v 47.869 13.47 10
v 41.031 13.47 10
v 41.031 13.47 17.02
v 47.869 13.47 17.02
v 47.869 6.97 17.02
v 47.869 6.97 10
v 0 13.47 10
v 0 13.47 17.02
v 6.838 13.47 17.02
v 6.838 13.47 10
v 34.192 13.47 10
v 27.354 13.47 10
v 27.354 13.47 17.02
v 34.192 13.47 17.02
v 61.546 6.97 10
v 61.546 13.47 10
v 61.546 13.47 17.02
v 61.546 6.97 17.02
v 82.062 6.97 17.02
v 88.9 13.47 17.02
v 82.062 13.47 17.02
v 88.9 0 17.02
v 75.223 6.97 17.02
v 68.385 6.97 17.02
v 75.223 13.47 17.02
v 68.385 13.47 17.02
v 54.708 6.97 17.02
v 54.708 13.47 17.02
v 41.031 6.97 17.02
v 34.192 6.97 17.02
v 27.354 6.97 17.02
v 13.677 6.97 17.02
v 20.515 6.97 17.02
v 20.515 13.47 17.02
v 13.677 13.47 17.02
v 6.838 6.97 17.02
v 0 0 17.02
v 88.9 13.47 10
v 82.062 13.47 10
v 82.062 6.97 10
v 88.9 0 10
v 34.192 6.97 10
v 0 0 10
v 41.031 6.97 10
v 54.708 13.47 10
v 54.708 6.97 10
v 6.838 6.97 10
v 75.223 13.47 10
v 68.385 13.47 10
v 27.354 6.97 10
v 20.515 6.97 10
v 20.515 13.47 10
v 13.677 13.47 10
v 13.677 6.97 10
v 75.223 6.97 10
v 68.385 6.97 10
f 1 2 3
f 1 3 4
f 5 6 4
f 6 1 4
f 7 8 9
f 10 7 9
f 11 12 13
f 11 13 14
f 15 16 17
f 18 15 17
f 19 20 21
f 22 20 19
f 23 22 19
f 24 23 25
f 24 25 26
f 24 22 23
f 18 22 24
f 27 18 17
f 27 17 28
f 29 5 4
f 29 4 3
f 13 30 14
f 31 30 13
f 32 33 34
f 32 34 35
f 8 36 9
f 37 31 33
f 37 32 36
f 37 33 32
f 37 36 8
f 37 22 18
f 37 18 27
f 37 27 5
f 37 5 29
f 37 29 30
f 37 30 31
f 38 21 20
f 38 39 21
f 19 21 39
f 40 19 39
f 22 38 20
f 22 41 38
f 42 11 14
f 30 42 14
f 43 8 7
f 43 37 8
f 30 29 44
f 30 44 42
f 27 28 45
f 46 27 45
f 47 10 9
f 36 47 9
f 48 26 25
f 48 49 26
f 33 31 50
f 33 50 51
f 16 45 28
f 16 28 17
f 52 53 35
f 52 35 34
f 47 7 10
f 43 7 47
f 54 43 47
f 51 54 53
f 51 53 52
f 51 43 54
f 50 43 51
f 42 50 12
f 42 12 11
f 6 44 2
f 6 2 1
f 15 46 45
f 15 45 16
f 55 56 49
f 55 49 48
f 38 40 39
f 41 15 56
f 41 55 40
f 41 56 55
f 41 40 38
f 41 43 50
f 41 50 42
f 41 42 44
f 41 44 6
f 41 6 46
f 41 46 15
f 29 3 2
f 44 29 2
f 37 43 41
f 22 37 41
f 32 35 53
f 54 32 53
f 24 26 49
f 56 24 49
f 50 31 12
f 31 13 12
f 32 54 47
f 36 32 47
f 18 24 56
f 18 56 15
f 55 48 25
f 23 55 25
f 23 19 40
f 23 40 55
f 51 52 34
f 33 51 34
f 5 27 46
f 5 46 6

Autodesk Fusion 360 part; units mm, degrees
sketch "Sketch1" plane through (0, 0, 0) normal (0, 1, 0) x (1, 0, 0)
  line L0 (0, 0) -> (88, 0)
  line L1 (88, 0) -> (88, 8.2)
  line L2 (88, 8.2) -> (0, 8.2)
  line L3 (0, 8.2) -> (0, 0)
  dimension "d1" = 88
  dimension "d2" = 8.2
sketch "Sketch2" plane through (0, 12.75, 0) normal (0, 1, 0) x (-1, 0, 0)
  line L0 (0, -8.2) -> (0, 0)
  line L1 (0, 0) -> (-88, 0)
  line L2 (-88, 0) -> (-88, -8.2)
  line L3 (-88, -8.2) -> (0, -8.2)
  line L4 (0, 0) -> (-6.77, 0)
  line L5 (-6.77, 0) -> (-6.77, -8.2)
  line L6 (-6.77, -8.2) -> (0, -8.2)
  line L7 (0, -8.2) -> (0, 0)
  line L8 (-6.77, -8.2) -> (-13.54, -8.2)
  line L9 (-13.54, -8.2) -> (-13.54, 0)
  line L10 (-13.54, 0) -> (-6.77, 0)
  line L11 (-6.77, 0) -> (-6.77, -8.2)
  dimension "d5" = 6.77
  dimension "d6" = 6.77
sketch "Sketch3" plane through (0, 12.75, 0) normal (0, 1, 0) x (-1, 0, 0)
  line L0 (-13.54, -8.2) -> (-13.54, 0)
  line L1 (-13.54, 0) -> (-88, 0)
  line L2 (-88, 0) -> (-88, -8.2)
  line L3 (-88, -8.2) -> (-13.54, -8.2)
  line L4 (-13.54, 0) -> (-20.31, 0)
  line L5 (-20.31, 0) -> (-20.31, -8.2)
  line L6 (-20.31, -8.2) -> (-13.54, -8.2)
  line L7 (-13.54, -8.2) -> (-13.54, 0)
  line L8 (-20.31, -8.2) -> (-27.08, -8.2)
  line L9 (-27.08, -8.2) -> (-27.08, 0)
  line L10 (-27.08, 0) -> (-20.31, 0)
  line L11 (-20.31, 0) -> (-20.31, -8.2)
  dimension "d9" = 6.77
  dimension "d10" = 6.77
sketch "Sketch4" plane through (0, 12.75, 0) normal (0, 1, 0) x (-1, 0, 0)
  line L0 (-27.08, -8.2) -> (-27.08, 0)
  line L1 (-27.08, 0) -> (-88, 0)
  line L2 (-88, 0) -> (-88, -8.2)
  line L3 (-88, -8.2) -> (-27.08, -8.2)
  line L4 (-27.08, 0) -> (-33.85, 0)
  line L5 (-33.85, 0) -> (-33.85, -8.2)
  line L6 (-33.85, -8.2) -> (-27.08, -8.2)
  line L7 (-27.08, -8.2) -> (-27.08, 0)
  line L8 (-33.85, -8.2) -> (-40.62, -8.2)
  line L9 (-40.62, -8.2) -> (-40.62, 0)
  line L10 (-40.62, 0) -> (-33.85, 0)
  line L11 (-33.85, 0) -> (-33.85, -8.2)
  dimension "d13" = 6.77
  dimension "d14" = 6.77
sketch "Sketch5" plane through (0, 12.75, 0) normal (0, 1, 0) x (-1, 0, 0)
  line L0 (-40.62, -8.2) -> (-40.62, 0)
  line L1 (-40.62, 0) -> (-88, 0)
  line L2 (-88, 0) -> (-88, -8.2)
  line L3 (-88, -8.2) -> (-40.62, -8.2)
  line L4 (-40.62, 0) -> (-47.39, 0)
  line L5 (-47.39, 0) -> (-47.39, -8.2)
  line L6 (-47.39, -8.2) -> (-40.62, -8.2)
  line L7 (-40.62, -8.2) -> (-40.62, 0)
  line L8 (-47.39, -8.2) -> (-54.16, -8.2)
  line L9 (-54.16, -8.2) -> (-54.16, 0)
  line L10 (-54.16, 0) -> (-47.39, 0)
  line L11 (-47.39, 0) -> (-47.39, -8.2)
  dimension "d17" = 6.77
  dimension "d18" = 6.77
sketch "Sketch6" plane through (0, 12.75, 0) normal (0, 1, 0) x (-1, 0, 0)
  line L0 (-54.16, -8.2) -> (-54.16, 0)
  line L1 (-54.16, 0) -> (-88, 0)
  line L2 (-88, 0) -> (-88, -8.2)
  line L3 (-88, -8.2) -> (-54.16, -8.2)
  line L4 (-54.16, 0) -> (-60.93, 0)
  line L5 (-60.93, 0) -> (-60.93, -8.2)
  line L6 (-60.93, -8.2) -> (-54.16, -8.2)
  line L7 (-54.16, -8.2) -> (-54.16, 0)
  line L8 (-60.93, 0) -> (-67.7, 0)
  line L9 (-67.7, 0) -> (-67.7, -8.2)
  line L10 (-67.7, -8.2) -> (-60.93, -8.2)
  line L11 (-60.93, -8.2) -> (-60.93, 0)
  dimension "d21" = 6.77
  dimension "d22" = 6.77
sketch "Sketch7" plane through (0, 12.75, 0) normal (0, 1, 0) x (-1, 0, 0)
  line L0 (-67.7, -8.2) -> (-67.7, 0)
  line L1 (-67.7, 0) -> (-88, 0)
  line L2 (-88, 0) -> (-88, -8.2)
  line L3 (-88, -8.2) -> (-67.7, -8.2)
  line L4 (-67.7, 0) -> (-74.47, 0)
  line L5 (-74.47, 0) -> (-74.47, -8.2)
  line L6 (-74.47, -8.2) -> (-67.7, -8.2)
  line L7 (-67.7, -8.2) -> (-67.7, 0)
  line L8 (-74.47, -8.2) -> (-81.24, -8.2)
  line L9 (-81.24, -8.2) -> (-81.24, 0)
  line L10 (-81.24, 0) -> (-74.47, 0)
  line L11 (-74.47, 0) -> (-74.47, -8.2)
  dimension "d25" = 6.77
  dimension "d26" = 6.77
sketch "Sketch8" plane through (0, 0, 0) normal (0, 1, 0) x (1, 0, 0)
sketch "Sketch9" plane through (0, 0, 0) normal (0, 1, 0) x (1, 0, 0)
  line L0 (0, -10) -> (88.9, -10)
  line L1 (88.9, -10) -> (88.9, -17.02)
  line L2 (88.9, -17.02) -> (0, -17.02)
  line L3 (0, -17.02) -> (0, -10)
  dimension "d32" = 88.9
  dimension "d33" = 7.02
extrude "Extrude9" add sketch "Sketch9" along normal blind 13.47
sketch "Sketch10" plane through (0, 13.47, 0) normal (0, 1, 0) x (-1, 0, 0)
  line L0 (0, 17.02) -> (-88.9, 17.02)
  line L1 (-88.9, 17.02) -> (-88.9, 10)
  line L2 (-88.9, 10) -> (0, 10)
  line L3 (0, 10) -> (0, 17.02)
  line L4 (-6.8385, 17.02) -> (-13.6769, 17.02)
  line L5 (-13.6769, 17.02) -> (-13.6769, 10)
  line L6 (-13.6769, 10) -> (-6.8385, 10)
  line L7 (-6.8385, 10) -> (-6.8385, 17.02)
  line L8 (-20.5154, 17.02) -> (-27.3538, 17.02)
  line L9 (-27.3538, 17.02) -> (-27.3538, 10)
  line L10 (-27.3538, 10) -> (-20.5154, 10)
  line L11 (-20.5154, 10) -> (-20.5154, 17.02)
  line L12 (-34.1923, 17.02) -> (-41.0308, 17.02)
  line L13 (-41.0308, 17.02) -> (-41.0308, 10)
  line L14 (-41.0308, 10) -> (-34.1923, 10)
  line L15 (-34.1923, 10) -> (-34.1923, 17.02)
  line L16 (-47.8692, 17.02) -> (-54.7077, 17.02)
  line L17 (-54.7077, 17.02) -> (-54.7077, 10)
  line L18 (-54.7077, 10) -> (-47.8692, 10)
  line L19 (-47.8692, 10) -> (-47.8692, 17.02)
  line L20 (-61.5462, 17.02) -> (-68.3846, 17.02)
  line L21 (-68.3846, 17.02) -> (-68.3846, 10)
  line L22 (-68.3846, 10) -> (-61.5462, 10)
  line L23 (-61.5462, 10) -> (-61.5462, 17.02)
  line L24 (-75.2231, 17.02) -> (-82.0615, 17.02)
  line L25 (-82.0615, 17.02) -> (-82.0615, 10)
  line L26 (-82.0615, 10) -> (-75.2231, 10)
  line L27 (-75.2231, 10) -> (-75.2231, 17.02)
  point P0 (0, 17.02)
  point P1 (-6.8385, 17.02)
  point P2 (-13.6769, 17.02)
  point P3 (-20.5154, 17.02)
  point P4 (-27.3538, 17.02)
  point P5 (-34.1923, 17.02)
  point P6 (-41.0308, 17.02)
  point P7 (-47.8692, 17.02)
  point P8 (-54.7077, 17.02)
  point P9 (-61.5462, 17.02)
  point P10 (-68.3846, 17.02)
  point P11 (-75.2231, 17.02)
  point P12 (-82.0615, 17.02)
  point P13 (-88.9, 17.02)
  dimension "d38" = 88.9
  dimension "d39" = 0
  dimension "d40" = 6.8385
  dimension "d43" = 6.8385
  dimension "d46" = 6.8385
  dimension "d47" = 6.8385
  dimension "d48" = 6.8385
  dimension "d49" = 7.02
  dimension "d50" = 6.8385
extrude "Extrude12" cut sketch "Sketch10" against normal blind 6.5 contours L0 L2 L4 L5 L6 L7
extrude "Extrude11" cut sketch "Sketch10" against normal blind 6.5 contours L0 L2 L4 L5 L6 L7
extrude "Extrude10" cut sketch "Sketch10" against normal blind 6.5 contours L0 L2 L4 L5 L6 L7
extrude "Extrude13" cut sketch "Sketch10" against normal blind 6.5 contours L0 L2 L8 L9 L10 L11
extrude "Extrude14" cut sketch "Sketch10" against normal blind 6.5 contours L0 L2 L12 L13 L14 L15
extrude "Extrude15" cut sketch "Sketch10" against normal blind 6.5 contours L0 L2 L16 L17 L18 L19
extrude "Extrude16" cut sketch "Sketch10" against normal blind 6.5 contours L0 L2 L20 L21 L22 L23
extrude "Extrude17" cut sketch "Sketch10" against normal blind 6.5 contours L0 L2 L24 L25 L26 L27
